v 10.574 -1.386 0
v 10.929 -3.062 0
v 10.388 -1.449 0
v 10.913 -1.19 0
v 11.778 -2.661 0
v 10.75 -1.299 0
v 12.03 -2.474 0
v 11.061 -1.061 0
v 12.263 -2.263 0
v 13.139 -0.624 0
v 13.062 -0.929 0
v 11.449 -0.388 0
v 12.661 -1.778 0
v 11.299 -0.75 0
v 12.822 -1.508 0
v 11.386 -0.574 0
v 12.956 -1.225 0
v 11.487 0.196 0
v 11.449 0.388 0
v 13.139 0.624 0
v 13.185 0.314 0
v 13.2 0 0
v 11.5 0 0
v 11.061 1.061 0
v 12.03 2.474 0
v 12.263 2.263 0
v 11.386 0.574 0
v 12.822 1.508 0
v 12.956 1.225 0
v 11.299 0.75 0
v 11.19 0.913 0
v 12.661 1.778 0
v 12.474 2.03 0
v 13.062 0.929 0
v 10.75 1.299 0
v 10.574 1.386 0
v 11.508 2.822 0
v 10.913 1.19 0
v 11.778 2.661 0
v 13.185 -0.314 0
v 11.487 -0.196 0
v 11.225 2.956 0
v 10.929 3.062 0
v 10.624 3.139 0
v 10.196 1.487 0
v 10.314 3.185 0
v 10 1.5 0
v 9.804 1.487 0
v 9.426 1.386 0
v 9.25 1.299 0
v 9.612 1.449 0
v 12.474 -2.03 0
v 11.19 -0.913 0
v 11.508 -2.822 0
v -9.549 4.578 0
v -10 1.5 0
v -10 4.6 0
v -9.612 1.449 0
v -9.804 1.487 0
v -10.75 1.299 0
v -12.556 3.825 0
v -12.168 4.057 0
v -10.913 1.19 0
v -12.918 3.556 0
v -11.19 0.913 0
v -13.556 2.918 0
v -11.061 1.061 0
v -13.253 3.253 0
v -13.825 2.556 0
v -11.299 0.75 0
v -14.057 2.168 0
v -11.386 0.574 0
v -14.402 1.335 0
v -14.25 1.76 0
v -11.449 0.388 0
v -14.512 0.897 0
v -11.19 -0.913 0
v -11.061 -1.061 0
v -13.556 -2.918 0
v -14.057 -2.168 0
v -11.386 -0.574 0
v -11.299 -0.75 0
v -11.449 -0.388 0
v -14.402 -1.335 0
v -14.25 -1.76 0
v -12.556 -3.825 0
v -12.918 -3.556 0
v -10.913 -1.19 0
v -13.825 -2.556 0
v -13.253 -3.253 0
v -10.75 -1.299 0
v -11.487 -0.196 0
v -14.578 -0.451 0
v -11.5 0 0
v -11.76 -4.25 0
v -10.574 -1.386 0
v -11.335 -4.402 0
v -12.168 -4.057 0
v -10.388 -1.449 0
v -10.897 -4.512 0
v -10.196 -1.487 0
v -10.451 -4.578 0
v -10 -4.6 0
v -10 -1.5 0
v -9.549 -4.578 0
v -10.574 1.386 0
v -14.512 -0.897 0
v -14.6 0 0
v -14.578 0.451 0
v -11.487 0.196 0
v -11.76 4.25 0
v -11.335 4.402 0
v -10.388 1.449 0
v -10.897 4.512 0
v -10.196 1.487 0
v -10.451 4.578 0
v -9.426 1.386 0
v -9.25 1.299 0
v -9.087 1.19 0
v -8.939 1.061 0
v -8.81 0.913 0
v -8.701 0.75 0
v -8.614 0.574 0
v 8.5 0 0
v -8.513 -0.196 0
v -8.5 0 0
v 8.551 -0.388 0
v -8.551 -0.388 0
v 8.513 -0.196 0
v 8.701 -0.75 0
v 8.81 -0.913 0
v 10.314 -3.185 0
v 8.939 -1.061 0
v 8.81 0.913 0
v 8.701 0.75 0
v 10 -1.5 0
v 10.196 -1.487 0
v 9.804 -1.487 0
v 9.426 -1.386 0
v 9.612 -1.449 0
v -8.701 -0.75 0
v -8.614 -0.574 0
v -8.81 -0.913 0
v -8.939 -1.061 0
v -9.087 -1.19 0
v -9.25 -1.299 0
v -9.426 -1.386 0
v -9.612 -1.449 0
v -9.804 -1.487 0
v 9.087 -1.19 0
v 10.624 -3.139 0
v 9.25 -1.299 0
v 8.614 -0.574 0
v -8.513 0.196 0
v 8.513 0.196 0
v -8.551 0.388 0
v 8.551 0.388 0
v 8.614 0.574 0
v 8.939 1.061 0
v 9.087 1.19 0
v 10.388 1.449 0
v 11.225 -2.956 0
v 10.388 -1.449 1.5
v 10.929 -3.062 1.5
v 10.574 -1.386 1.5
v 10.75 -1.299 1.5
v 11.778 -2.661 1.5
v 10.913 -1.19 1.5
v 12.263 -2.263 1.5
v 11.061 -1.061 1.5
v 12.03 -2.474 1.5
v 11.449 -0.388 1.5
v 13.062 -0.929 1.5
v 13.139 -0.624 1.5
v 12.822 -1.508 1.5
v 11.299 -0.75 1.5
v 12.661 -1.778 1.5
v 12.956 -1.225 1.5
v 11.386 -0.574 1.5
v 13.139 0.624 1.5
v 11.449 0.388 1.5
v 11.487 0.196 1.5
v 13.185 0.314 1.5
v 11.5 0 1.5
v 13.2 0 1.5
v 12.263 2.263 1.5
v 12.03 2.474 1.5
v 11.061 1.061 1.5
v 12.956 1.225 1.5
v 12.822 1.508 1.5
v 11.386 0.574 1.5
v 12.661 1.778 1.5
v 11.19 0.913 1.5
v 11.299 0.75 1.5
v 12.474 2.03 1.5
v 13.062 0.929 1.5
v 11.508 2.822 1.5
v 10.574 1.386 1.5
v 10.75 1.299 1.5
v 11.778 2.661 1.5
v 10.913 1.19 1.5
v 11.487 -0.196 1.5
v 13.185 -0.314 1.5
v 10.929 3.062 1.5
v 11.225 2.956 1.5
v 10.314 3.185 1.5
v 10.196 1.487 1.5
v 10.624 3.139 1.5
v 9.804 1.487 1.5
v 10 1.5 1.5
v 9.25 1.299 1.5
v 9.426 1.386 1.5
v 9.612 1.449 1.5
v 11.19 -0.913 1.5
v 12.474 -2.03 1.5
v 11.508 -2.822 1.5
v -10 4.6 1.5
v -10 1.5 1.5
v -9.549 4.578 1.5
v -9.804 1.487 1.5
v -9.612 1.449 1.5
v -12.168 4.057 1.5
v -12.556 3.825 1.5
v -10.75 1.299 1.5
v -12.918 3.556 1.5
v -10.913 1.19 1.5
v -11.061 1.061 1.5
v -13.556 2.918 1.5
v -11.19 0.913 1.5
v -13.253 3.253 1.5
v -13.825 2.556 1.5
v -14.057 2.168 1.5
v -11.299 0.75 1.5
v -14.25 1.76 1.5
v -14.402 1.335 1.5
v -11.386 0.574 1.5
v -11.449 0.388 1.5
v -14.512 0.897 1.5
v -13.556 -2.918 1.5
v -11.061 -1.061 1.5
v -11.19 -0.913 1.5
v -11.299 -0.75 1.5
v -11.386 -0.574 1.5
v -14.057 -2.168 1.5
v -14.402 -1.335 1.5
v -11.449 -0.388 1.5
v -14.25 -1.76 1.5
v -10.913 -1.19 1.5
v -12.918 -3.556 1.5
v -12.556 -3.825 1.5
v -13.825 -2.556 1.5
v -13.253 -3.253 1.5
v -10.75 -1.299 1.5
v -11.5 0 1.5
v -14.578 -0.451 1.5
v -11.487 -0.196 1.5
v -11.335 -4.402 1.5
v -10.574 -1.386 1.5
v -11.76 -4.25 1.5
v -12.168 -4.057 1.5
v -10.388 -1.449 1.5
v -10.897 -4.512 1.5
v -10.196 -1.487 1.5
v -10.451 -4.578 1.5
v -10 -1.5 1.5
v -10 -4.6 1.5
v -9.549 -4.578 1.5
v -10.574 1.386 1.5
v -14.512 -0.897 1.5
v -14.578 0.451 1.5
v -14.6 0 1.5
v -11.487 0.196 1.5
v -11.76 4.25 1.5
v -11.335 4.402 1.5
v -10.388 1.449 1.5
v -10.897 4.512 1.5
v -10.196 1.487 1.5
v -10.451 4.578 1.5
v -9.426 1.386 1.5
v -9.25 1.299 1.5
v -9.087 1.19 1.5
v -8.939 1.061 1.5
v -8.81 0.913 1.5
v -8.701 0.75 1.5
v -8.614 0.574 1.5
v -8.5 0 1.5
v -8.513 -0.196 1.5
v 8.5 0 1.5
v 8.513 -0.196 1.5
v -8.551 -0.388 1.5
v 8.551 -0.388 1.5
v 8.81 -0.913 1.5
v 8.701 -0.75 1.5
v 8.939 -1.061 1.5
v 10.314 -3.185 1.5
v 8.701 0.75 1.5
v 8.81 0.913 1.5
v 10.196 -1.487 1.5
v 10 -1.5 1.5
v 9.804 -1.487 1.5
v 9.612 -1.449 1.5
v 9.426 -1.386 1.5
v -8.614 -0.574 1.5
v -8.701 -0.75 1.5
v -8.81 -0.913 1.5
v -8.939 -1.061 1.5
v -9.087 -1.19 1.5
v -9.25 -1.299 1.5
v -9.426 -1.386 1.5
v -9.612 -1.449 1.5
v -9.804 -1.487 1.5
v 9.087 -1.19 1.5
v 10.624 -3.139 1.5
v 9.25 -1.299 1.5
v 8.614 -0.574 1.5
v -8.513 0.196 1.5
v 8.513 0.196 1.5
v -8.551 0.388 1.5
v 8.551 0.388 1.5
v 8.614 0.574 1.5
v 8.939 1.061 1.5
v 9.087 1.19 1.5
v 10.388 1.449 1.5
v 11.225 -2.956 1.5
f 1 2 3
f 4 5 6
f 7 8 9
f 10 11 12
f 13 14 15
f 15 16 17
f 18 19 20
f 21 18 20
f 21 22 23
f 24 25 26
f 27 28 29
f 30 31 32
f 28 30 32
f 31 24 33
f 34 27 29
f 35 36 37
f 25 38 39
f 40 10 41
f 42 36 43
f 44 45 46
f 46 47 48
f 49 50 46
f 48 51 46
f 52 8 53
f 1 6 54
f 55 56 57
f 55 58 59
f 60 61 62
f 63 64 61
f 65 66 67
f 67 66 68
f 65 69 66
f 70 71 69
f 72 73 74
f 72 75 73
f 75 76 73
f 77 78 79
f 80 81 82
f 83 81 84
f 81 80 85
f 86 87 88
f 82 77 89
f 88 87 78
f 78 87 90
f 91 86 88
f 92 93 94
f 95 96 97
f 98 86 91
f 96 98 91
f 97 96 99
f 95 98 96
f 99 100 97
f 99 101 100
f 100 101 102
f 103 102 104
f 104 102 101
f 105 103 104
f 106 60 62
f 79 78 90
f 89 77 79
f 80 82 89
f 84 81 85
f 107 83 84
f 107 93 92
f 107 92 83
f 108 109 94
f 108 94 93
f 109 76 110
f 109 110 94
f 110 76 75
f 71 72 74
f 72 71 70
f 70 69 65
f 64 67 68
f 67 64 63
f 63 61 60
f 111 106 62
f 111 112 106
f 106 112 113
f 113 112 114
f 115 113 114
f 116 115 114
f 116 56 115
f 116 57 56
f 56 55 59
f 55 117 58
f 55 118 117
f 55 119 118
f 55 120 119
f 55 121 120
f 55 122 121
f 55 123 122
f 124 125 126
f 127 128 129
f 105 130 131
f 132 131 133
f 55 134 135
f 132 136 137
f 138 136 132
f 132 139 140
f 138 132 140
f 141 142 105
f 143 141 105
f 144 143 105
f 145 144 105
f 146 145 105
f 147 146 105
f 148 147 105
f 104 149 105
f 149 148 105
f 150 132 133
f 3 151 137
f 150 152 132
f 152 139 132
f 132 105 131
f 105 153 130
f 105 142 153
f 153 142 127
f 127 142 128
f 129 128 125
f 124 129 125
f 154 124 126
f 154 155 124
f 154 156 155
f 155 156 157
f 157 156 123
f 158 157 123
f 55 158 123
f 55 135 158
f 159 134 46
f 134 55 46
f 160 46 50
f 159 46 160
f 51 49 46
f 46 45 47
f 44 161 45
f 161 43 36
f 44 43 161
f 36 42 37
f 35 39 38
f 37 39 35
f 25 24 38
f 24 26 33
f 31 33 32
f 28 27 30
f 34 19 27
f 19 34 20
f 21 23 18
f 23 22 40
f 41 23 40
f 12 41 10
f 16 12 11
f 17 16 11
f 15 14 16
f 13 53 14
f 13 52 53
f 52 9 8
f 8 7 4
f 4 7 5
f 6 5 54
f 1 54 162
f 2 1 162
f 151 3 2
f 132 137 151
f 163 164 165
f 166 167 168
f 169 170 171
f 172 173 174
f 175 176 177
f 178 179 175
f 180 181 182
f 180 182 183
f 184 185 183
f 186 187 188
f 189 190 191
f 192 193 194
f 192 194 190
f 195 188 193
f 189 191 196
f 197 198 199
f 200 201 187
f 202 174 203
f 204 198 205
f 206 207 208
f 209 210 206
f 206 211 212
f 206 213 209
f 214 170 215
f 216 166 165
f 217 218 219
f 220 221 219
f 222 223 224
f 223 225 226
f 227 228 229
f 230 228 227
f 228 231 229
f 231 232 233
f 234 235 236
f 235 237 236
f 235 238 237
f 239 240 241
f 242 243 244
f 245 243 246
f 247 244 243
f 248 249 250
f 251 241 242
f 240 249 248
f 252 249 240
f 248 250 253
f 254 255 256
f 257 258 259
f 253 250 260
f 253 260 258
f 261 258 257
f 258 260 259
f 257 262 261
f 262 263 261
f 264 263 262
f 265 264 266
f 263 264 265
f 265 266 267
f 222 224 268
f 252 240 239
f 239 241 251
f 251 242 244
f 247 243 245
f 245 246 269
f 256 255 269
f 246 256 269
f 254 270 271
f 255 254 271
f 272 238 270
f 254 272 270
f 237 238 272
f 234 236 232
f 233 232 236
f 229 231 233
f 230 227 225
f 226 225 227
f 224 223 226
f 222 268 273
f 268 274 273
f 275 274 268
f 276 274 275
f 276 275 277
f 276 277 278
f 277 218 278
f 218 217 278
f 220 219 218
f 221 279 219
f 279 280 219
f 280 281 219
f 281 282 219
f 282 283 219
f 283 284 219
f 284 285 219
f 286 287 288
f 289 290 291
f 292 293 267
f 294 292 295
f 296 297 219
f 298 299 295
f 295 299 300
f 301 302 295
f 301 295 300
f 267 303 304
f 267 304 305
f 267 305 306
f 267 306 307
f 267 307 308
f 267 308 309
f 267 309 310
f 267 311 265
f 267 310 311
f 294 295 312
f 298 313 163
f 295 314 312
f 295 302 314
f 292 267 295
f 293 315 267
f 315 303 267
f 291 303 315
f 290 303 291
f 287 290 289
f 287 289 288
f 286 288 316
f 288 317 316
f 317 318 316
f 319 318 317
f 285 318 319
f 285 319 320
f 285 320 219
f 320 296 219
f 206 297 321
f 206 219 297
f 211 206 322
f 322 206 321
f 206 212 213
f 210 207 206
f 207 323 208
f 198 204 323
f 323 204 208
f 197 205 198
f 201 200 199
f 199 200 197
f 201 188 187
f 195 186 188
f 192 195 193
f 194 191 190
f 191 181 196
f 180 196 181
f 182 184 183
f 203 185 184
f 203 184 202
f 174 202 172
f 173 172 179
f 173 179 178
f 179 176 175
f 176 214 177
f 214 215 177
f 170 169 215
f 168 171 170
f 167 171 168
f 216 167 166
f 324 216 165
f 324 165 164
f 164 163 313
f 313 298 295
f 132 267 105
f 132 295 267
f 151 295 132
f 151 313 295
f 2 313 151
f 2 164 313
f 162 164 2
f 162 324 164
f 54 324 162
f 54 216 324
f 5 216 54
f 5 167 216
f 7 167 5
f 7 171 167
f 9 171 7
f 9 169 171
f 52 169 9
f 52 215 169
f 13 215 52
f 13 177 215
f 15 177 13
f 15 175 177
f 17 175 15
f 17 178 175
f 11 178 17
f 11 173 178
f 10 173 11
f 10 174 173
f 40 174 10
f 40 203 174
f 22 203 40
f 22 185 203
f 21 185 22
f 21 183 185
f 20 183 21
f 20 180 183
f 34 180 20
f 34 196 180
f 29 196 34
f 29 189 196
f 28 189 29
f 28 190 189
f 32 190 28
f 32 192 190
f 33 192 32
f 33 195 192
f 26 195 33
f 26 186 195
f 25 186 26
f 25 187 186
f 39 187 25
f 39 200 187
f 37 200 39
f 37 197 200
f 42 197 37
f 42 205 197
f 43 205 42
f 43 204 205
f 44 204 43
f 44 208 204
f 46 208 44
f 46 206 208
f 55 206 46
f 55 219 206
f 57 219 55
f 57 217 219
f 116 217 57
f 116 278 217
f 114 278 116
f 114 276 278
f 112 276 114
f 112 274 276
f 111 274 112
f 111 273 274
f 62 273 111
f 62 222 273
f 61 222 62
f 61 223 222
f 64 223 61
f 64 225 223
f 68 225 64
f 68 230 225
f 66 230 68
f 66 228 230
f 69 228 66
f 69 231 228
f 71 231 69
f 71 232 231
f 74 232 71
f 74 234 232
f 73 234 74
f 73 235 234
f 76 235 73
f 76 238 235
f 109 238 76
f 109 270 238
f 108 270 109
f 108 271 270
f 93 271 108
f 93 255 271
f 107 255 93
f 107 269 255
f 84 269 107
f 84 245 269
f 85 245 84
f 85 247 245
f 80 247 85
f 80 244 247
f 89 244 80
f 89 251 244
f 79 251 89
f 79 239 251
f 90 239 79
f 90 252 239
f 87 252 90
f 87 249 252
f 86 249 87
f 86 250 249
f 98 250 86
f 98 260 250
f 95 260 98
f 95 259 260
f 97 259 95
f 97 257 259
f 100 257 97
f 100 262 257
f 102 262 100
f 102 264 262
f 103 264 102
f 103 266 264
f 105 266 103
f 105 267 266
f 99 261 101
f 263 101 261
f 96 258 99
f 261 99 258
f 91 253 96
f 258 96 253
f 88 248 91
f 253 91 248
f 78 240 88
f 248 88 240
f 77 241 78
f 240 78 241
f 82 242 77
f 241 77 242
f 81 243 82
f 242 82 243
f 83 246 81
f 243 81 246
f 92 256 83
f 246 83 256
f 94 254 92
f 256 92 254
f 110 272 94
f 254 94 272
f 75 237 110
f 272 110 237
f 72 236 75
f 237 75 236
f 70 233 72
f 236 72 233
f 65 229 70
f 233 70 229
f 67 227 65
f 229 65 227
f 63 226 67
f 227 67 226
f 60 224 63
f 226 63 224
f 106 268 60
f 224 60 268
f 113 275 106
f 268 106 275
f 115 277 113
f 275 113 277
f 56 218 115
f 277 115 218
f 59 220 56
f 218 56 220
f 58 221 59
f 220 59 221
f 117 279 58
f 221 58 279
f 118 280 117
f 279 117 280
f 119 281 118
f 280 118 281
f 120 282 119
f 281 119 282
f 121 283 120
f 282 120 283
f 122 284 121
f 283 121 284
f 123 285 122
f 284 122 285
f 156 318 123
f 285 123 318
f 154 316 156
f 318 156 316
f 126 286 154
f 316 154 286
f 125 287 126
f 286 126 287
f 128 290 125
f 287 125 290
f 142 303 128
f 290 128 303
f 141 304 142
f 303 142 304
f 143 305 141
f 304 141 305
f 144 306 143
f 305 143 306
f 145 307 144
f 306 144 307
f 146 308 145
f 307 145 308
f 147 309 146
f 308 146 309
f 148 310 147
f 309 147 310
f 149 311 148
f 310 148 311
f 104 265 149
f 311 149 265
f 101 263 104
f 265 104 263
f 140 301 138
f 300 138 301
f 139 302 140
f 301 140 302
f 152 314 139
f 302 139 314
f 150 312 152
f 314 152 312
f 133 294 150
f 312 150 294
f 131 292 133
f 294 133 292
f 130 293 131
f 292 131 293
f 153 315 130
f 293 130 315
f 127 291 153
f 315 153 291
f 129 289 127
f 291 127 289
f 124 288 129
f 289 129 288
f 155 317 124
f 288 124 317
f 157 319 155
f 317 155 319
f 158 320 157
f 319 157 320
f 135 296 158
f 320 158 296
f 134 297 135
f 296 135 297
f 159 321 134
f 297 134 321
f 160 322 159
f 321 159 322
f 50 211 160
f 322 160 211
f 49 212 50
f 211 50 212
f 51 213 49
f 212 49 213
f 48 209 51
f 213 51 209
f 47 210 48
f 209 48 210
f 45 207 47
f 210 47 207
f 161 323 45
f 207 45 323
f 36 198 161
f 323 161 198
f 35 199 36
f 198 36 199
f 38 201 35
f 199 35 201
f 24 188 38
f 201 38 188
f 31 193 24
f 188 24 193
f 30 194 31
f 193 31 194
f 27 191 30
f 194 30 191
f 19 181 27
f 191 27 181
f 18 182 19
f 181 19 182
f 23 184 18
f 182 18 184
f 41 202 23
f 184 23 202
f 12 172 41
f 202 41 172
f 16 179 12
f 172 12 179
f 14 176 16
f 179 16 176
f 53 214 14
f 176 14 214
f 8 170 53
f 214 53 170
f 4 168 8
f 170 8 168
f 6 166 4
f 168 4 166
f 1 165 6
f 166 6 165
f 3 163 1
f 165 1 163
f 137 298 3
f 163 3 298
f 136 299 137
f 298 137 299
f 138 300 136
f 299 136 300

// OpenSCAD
// part_id: a12
// name: A12 link
// source_drawing_ids: DRW-001
// units: mm
// revision: 0.1-placeholder
// SPDX-License-Identifier: MIT

module part_a12(th = 1.5) {
    linear_extrude(height = th)
        difference() {
            hull() {
                translate([-10, 0]) circle(r = 4.6, $fn = 64);
                translate([10, 0]) circle(r = 3.2, $fn = 64);
                translate([-2, 0]) circle(r = 2.6, $fn = 64);
            }
            translate([-10, 0]) circle(d = 3.0, $fn = 48);
            translate([10, 0]) circle(d = 3.0, $fn = 48);
        }
}


// ---- "main guard" ----
// Default to previewing when opened directly:
if (is_undef(__LIB_MODE__)) {
    part_a12();
}
